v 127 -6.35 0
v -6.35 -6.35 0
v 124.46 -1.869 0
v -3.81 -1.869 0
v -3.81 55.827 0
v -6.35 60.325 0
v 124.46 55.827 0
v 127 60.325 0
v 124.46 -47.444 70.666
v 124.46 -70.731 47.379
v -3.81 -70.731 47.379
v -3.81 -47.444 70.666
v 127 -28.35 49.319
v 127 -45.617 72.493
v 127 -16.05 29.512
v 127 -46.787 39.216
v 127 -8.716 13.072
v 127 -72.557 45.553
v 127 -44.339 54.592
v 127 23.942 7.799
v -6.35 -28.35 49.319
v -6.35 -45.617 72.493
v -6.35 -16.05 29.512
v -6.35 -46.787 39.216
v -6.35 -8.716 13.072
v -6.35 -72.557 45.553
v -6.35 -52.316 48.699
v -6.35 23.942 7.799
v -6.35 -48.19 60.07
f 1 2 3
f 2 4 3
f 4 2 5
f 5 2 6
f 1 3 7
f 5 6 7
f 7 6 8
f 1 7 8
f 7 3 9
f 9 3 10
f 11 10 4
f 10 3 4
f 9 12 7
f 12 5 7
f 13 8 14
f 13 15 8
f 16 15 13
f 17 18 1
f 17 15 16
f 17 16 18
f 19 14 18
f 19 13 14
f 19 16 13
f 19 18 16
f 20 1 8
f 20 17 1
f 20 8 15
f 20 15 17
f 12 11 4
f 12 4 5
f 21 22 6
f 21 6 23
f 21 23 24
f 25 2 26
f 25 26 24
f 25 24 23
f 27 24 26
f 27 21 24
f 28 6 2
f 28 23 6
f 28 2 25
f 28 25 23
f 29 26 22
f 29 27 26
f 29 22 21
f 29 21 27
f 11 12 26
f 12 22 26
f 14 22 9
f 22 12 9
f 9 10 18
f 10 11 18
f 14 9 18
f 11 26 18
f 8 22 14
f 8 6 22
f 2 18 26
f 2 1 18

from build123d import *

# Parameters (mm, degrees)
F4_W = 133.35
F4_H = 38.1
F0_W = 133.35
F0_H = 66.675
F6_T = -2.54


with BuildPart() as f5:
    # F4 (on face) → F5 section 0
    with BuildSketch(Plane(origin=(0, -59.055, 59.055), x_dir=(1, 0, 0), z_dir=(0, 0.7071067812, -0.7071067812))):
        with Locations((60.325, 0.0451280605)):
            Rectangle(F4_W, F4_H)
    # F0 (on Top) → F5 section 1
    with BuildSketch(Plane.XY):
        with Locations((60.325, 26.9875)):
            Rectangle(F0_W, F0_H)
    loft()

    # F6
    f6_openings = [f5.faces().sort_by_distance(p)[0] for p in [
        (60.325, 26.9875, 0),
        (60.325, -59.08691, 59.02309),
    ]]
    offset(amount=F6_T, openings=f6_openings)


solid = f5.part
